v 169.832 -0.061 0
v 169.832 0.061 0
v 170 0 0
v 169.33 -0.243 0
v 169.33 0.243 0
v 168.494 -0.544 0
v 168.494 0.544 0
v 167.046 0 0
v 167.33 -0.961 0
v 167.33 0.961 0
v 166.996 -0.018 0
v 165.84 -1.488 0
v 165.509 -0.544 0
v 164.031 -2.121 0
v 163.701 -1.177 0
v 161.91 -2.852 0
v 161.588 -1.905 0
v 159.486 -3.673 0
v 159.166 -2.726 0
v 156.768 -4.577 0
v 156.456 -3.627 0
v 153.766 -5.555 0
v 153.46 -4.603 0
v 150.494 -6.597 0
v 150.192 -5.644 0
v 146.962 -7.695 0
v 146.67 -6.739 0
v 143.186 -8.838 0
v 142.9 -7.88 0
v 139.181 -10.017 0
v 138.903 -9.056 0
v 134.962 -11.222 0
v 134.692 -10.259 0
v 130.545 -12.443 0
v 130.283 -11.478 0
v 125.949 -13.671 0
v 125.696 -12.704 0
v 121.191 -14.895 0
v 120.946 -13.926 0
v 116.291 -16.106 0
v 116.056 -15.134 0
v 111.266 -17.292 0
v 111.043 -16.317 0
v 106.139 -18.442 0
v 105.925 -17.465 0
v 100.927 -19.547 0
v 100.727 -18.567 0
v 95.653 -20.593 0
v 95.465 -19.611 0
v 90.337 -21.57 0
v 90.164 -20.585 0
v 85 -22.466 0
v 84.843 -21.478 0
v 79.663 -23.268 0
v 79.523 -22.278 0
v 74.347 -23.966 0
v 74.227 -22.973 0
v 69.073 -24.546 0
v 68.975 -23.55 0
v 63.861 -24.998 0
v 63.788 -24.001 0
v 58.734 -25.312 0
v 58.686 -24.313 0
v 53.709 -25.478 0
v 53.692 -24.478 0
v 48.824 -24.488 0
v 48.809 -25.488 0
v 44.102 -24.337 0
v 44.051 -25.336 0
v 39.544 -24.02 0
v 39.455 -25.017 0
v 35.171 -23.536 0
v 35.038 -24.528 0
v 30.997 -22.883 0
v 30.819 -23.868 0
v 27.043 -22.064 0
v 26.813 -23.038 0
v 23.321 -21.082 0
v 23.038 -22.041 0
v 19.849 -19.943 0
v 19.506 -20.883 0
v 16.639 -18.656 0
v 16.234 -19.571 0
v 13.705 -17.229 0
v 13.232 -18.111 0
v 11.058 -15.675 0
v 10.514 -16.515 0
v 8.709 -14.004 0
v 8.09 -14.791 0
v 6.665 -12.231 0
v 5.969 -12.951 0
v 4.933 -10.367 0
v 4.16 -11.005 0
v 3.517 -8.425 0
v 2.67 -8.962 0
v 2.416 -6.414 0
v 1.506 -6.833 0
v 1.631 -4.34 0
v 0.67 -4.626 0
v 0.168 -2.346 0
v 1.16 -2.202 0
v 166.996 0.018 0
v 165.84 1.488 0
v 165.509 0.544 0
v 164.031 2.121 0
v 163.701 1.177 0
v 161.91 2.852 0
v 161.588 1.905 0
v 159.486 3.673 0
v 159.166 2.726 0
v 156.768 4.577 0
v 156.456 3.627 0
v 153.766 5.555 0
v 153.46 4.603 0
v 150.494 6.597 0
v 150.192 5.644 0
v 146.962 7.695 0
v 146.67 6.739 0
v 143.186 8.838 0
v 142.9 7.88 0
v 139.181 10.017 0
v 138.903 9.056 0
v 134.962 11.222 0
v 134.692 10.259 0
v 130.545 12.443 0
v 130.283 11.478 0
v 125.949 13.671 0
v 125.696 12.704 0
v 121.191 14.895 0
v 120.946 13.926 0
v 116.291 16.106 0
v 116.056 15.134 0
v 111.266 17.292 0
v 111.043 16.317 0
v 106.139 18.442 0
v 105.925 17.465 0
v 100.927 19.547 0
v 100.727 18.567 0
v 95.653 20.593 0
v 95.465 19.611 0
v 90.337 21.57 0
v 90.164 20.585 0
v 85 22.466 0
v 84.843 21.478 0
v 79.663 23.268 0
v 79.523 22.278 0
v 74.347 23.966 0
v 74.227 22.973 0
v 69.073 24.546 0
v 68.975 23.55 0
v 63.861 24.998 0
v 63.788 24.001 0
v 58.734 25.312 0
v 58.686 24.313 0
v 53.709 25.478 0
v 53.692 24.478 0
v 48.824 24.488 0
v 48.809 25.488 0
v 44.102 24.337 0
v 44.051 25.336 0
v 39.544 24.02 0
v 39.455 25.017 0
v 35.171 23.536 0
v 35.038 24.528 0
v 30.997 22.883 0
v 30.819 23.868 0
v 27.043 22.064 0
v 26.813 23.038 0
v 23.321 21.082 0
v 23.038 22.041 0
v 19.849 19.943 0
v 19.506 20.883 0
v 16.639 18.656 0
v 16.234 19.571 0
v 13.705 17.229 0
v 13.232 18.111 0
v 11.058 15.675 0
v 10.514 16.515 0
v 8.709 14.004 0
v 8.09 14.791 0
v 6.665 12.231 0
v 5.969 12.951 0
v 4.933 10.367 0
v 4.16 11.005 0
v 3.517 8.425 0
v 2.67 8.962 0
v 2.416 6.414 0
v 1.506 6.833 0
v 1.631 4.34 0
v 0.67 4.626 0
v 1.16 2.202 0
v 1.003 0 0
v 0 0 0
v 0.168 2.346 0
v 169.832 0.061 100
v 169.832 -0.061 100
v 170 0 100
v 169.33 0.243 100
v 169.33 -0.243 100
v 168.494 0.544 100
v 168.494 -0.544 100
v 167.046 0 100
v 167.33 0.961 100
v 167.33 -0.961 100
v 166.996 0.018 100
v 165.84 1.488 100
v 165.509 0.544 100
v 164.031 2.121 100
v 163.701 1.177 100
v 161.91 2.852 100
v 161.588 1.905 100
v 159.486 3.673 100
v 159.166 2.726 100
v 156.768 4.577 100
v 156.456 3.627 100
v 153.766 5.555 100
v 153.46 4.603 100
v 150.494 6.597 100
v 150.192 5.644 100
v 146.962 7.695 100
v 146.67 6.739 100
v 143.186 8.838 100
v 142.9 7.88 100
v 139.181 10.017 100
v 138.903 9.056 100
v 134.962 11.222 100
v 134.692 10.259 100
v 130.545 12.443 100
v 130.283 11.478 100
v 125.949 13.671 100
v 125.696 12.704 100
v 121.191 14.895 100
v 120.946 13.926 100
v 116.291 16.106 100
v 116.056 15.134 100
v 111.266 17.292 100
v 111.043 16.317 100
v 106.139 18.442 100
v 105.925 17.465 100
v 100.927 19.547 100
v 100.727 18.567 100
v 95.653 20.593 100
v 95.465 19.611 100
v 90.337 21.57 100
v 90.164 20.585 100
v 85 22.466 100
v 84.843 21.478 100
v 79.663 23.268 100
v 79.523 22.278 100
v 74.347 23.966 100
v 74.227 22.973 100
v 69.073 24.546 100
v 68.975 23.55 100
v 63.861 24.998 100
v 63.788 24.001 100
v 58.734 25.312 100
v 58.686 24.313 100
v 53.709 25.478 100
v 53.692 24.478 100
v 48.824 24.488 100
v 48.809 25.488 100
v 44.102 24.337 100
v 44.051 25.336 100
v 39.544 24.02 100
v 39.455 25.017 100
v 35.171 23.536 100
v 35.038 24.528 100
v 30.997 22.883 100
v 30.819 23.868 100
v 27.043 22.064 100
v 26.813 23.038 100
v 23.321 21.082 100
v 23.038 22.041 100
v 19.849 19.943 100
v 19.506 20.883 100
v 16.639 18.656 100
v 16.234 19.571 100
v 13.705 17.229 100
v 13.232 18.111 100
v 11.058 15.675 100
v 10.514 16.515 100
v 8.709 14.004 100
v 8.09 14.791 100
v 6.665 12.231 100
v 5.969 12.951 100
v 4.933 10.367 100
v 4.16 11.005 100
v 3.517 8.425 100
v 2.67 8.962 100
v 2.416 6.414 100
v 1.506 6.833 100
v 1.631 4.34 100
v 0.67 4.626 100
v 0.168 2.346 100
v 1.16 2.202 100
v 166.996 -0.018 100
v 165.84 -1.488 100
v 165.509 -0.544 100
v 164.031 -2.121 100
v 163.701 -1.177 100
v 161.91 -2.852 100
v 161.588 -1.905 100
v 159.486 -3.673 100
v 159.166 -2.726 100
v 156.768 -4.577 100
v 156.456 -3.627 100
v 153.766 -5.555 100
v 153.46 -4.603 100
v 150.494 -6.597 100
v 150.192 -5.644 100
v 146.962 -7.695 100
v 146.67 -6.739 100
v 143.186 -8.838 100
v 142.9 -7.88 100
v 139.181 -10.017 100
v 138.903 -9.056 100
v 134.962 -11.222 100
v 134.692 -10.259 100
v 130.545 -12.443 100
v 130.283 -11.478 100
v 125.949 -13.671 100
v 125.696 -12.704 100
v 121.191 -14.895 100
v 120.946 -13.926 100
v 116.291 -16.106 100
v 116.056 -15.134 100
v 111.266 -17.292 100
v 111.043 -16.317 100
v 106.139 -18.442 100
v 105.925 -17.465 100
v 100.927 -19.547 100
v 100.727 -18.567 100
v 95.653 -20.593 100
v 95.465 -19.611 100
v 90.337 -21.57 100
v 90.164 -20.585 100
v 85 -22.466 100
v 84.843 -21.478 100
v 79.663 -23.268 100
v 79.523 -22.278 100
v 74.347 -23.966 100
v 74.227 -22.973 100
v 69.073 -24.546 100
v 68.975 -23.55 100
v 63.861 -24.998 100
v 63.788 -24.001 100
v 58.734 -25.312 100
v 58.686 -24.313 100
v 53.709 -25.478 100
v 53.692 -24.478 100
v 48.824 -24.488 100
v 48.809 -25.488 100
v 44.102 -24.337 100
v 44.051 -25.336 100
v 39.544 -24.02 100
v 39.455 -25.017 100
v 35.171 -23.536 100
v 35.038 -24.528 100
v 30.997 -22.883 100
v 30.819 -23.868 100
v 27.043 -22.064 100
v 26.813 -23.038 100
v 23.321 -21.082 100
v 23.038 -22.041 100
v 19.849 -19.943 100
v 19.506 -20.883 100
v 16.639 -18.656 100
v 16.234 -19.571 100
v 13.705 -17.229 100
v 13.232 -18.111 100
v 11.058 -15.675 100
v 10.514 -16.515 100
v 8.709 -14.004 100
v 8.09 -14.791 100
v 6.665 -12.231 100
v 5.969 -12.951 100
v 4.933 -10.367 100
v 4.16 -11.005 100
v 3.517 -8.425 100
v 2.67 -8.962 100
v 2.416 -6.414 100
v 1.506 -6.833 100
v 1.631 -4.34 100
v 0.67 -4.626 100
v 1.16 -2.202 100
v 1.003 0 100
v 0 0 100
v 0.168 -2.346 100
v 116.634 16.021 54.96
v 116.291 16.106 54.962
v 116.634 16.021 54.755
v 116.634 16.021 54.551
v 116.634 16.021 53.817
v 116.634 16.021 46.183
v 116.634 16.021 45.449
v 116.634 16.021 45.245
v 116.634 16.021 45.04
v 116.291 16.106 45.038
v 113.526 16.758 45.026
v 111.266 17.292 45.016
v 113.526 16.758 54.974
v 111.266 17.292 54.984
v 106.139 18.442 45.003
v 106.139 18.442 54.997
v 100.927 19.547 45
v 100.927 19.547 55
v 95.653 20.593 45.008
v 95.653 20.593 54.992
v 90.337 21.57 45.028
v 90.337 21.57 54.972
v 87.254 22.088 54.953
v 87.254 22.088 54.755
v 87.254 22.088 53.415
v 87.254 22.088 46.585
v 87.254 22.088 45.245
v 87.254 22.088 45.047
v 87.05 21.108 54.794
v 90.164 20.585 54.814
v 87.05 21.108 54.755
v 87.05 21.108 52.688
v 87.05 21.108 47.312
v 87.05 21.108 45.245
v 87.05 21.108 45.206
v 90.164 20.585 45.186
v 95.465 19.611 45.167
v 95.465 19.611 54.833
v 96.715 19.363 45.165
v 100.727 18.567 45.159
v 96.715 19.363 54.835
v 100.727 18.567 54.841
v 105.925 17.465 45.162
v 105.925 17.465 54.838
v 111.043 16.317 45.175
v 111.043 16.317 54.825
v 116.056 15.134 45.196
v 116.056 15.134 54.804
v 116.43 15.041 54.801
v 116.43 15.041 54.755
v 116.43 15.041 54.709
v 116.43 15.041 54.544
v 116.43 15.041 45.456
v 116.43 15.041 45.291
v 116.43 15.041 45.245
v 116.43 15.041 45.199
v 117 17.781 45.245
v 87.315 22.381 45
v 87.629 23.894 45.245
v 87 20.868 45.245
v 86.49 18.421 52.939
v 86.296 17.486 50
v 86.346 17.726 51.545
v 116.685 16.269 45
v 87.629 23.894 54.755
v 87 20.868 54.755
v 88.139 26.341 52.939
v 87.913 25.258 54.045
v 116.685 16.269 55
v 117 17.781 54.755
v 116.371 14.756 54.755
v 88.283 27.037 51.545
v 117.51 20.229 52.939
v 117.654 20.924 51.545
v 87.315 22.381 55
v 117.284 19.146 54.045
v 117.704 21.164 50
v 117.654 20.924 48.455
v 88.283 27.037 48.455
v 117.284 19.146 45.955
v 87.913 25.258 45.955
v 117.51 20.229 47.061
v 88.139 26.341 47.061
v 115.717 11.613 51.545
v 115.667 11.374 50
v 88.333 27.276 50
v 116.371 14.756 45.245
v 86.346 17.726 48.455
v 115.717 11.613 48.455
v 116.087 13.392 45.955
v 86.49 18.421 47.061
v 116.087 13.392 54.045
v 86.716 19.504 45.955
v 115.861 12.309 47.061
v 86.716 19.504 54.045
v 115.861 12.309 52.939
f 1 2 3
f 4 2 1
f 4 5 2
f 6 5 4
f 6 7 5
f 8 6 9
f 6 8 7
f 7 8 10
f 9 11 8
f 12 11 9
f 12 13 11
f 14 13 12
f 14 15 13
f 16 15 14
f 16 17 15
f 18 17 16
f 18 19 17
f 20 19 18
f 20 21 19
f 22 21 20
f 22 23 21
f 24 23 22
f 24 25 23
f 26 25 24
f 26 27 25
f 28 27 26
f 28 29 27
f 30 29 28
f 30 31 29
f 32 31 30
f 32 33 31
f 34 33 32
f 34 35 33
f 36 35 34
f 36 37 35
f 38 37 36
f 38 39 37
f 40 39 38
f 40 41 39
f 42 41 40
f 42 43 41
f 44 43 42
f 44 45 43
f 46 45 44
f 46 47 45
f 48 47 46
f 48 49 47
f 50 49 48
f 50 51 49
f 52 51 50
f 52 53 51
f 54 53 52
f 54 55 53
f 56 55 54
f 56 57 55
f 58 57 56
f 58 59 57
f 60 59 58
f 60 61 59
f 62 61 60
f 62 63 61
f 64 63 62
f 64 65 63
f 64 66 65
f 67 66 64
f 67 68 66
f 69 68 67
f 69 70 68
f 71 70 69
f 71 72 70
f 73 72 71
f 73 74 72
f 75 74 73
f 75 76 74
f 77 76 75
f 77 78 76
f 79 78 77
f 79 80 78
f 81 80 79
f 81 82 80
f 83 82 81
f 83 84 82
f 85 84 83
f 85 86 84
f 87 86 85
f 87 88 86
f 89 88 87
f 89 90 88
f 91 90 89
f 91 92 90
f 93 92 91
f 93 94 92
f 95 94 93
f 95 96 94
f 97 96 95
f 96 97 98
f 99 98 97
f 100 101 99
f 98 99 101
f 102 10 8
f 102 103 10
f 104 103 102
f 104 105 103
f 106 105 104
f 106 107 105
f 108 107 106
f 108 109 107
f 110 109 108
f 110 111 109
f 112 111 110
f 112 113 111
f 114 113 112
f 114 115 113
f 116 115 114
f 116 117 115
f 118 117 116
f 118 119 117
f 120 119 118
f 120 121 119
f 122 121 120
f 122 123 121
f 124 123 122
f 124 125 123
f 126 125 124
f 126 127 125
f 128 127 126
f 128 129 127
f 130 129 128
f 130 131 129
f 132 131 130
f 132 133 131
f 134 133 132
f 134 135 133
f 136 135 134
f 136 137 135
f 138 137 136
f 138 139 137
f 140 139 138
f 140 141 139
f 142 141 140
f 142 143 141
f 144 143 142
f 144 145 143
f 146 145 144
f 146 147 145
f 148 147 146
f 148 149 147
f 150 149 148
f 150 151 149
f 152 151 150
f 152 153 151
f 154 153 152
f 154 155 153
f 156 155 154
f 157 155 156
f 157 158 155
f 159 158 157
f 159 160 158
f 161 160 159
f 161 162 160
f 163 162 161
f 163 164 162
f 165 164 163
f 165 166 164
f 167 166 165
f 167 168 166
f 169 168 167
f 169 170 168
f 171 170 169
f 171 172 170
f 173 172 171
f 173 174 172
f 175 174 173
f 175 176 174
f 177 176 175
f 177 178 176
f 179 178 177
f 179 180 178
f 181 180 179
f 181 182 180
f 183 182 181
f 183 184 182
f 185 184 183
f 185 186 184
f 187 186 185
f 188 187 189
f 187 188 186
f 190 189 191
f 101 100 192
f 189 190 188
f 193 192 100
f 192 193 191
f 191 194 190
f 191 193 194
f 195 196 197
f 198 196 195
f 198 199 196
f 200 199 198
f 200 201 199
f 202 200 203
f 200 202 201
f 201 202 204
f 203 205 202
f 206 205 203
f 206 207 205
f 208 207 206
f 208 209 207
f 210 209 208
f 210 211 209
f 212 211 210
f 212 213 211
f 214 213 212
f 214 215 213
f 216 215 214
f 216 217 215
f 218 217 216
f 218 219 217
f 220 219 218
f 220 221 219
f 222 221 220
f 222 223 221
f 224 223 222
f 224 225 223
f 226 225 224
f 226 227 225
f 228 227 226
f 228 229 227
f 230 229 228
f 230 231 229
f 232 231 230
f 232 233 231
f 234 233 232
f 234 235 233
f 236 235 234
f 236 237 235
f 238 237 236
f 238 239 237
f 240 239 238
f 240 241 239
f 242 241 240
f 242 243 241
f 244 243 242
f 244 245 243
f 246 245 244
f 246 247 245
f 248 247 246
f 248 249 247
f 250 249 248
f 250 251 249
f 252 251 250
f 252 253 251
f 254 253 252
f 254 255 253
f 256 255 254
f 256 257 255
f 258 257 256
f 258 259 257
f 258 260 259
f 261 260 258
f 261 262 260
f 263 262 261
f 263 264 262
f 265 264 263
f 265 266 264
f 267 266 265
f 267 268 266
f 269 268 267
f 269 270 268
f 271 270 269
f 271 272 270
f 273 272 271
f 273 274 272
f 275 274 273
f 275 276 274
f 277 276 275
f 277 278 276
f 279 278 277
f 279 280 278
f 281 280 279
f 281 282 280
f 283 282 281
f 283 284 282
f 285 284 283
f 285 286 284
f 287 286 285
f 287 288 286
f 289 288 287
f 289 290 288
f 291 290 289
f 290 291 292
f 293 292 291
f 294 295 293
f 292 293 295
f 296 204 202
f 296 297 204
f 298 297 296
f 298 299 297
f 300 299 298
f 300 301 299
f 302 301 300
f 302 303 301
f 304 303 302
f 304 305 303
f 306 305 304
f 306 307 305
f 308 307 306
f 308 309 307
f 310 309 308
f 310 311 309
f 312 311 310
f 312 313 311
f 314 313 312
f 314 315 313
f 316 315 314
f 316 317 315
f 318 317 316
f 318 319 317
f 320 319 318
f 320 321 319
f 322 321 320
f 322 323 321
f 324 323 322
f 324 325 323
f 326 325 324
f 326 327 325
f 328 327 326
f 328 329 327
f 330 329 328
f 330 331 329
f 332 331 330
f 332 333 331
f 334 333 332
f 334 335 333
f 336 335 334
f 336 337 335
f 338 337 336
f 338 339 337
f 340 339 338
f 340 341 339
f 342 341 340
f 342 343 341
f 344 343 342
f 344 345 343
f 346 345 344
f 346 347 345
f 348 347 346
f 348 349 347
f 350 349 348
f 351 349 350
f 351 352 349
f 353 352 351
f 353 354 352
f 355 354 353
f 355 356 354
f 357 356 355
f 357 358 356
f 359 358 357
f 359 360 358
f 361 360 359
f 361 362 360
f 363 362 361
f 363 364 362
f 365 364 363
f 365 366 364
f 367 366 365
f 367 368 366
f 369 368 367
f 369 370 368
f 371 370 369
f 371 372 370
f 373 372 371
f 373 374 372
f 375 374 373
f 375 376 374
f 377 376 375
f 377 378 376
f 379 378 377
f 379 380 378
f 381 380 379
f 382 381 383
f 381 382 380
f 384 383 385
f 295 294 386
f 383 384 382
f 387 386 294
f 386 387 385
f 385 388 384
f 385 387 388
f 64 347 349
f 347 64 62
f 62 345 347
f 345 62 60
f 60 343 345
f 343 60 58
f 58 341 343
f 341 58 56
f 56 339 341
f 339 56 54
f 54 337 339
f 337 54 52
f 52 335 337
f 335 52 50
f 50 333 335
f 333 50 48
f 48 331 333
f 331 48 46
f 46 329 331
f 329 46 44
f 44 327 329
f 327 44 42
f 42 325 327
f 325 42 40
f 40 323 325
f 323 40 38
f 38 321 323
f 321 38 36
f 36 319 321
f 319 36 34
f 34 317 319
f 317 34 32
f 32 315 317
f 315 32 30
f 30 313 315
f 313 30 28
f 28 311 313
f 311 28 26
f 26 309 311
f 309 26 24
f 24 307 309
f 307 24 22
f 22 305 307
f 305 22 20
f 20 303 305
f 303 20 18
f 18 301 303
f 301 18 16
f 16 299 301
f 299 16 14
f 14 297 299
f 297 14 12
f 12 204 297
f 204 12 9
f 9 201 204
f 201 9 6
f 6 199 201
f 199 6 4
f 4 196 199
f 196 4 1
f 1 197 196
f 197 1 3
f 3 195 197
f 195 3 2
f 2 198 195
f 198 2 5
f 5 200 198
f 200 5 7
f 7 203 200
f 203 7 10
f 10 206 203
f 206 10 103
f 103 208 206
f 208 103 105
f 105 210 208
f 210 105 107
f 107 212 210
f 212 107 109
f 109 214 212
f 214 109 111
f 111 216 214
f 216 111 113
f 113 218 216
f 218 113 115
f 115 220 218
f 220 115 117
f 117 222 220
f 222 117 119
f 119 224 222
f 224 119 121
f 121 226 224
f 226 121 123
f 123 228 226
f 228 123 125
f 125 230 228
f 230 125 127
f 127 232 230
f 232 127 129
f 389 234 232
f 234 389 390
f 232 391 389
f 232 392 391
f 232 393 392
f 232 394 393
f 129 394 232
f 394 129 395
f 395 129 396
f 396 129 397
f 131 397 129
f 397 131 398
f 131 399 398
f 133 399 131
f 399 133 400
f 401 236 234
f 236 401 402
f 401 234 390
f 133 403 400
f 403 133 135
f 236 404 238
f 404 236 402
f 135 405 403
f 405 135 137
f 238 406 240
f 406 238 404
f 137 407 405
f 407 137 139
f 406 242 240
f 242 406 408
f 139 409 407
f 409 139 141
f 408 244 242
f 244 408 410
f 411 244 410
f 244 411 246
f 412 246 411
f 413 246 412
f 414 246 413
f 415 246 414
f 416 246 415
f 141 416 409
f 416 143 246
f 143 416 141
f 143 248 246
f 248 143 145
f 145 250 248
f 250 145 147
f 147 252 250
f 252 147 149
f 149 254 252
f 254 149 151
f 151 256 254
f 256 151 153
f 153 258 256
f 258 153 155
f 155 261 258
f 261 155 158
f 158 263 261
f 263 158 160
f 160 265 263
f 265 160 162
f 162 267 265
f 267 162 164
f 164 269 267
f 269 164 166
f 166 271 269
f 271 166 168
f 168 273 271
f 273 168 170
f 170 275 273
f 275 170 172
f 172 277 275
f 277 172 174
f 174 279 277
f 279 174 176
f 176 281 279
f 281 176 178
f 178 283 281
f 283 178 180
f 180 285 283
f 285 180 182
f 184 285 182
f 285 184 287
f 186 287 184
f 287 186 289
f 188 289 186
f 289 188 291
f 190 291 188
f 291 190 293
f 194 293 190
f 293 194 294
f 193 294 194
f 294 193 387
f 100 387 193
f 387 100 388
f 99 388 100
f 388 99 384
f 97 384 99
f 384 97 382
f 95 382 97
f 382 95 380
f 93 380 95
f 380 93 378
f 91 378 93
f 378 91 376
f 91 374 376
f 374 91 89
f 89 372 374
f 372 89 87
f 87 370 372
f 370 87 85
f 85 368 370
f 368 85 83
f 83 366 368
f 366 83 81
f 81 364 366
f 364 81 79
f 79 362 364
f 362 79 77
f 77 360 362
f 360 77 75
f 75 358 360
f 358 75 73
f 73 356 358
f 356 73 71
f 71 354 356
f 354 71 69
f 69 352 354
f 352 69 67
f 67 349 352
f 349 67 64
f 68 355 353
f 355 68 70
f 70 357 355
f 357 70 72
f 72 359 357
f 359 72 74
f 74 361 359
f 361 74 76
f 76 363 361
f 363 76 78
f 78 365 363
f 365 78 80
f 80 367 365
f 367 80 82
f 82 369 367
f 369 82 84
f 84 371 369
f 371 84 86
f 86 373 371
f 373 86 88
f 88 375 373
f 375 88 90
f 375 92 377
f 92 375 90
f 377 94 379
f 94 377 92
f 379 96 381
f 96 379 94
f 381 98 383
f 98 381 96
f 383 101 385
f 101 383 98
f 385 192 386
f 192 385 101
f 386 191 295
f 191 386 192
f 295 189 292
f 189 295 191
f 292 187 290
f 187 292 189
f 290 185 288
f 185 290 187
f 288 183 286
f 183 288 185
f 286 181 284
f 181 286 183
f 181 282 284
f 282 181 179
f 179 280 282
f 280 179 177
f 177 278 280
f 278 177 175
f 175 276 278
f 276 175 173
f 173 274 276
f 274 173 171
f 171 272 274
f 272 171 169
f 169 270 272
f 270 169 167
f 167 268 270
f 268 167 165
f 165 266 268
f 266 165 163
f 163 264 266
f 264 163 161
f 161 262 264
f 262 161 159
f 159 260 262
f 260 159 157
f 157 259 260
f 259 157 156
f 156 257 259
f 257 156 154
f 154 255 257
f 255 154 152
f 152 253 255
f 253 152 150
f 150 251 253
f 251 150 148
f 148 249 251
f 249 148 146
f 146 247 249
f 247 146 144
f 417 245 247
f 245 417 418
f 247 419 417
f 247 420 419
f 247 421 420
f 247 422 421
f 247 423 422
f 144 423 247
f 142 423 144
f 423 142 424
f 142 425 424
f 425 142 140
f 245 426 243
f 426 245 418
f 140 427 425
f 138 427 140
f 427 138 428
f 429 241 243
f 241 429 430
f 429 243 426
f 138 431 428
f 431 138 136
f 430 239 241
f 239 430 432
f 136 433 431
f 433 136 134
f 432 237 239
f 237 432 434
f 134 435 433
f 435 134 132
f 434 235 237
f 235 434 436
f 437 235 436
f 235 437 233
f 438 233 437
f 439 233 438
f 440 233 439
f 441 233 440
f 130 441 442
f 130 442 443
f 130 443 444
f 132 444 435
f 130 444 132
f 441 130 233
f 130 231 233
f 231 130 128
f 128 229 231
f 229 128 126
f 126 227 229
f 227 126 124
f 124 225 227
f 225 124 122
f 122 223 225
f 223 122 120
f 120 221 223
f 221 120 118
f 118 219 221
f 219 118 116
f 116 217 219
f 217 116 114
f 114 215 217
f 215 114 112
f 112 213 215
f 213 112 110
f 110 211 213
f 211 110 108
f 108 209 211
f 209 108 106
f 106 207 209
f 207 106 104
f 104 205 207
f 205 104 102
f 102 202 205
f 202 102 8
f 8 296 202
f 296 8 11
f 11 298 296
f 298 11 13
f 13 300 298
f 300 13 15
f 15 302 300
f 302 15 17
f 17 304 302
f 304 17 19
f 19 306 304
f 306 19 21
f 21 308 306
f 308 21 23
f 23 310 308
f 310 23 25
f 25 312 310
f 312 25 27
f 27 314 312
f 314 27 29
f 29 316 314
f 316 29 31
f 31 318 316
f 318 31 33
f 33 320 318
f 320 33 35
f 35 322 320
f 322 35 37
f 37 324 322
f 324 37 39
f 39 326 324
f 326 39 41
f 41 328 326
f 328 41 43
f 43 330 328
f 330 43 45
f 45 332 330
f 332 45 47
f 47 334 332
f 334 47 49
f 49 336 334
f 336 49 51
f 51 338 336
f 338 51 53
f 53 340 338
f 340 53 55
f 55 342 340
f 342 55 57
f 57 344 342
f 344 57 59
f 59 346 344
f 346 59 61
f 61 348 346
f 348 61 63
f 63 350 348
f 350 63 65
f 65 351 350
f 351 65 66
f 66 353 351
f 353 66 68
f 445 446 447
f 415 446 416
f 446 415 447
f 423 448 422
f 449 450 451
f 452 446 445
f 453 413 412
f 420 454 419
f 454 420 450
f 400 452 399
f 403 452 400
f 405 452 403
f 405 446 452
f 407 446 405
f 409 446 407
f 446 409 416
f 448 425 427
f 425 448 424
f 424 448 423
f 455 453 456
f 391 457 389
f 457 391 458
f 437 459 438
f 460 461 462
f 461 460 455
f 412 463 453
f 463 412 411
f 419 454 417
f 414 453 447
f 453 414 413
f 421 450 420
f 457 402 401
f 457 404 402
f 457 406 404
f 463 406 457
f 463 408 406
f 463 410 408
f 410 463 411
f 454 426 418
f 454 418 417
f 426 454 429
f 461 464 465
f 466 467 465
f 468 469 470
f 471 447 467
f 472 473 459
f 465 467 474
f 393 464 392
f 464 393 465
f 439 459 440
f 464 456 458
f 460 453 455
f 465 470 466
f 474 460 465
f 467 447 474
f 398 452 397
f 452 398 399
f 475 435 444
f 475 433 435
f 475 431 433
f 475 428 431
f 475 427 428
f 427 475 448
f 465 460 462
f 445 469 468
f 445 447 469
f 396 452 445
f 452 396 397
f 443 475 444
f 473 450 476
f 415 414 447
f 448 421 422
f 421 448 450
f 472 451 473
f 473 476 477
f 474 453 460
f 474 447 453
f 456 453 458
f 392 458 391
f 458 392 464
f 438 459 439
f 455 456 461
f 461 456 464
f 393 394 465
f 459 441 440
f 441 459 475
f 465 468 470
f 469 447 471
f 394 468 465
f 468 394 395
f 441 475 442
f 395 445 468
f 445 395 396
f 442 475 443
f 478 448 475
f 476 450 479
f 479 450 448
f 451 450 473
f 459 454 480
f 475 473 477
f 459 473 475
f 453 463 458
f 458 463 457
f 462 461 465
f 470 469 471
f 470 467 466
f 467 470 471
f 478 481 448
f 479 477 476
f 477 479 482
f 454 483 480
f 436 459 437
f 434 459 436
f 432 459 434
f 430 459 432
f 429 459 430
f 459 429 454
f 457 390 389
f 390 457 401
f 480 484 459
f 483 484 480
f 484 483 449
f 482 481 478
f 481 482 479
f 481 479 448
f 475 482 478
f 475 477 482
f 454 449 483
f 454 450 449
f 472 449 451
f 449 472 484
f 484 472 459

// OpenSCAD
// file: lib/naca4.scad
// Naca4.scad - library for parametric airfoils of 4 digit NACA series
// Code: Rudolf Huttary, Berlin 
// June 2015
// commercial use prohibited


// general use: for more examples refer to sampler.scad
// naca = naca digits or 3el vector  (default = 12 or [0, 0, .12])
// L    = chord length [mm]      (default= 100)
// N    = # sample points        (default= 81)
// h    = height [mm]            (default= 1)
// open = close at the thin end? (default = true)
// two equivalent example calls
 airfoil(naca = 2408, L = 60, N=1001, h = 30, open = false); 
// airfoil(naca = [.2, .4, .32], L = 60, N=1001, h = 30, open = false); 

module help()
{
  echo(str("\n\nList of signatures in lib:\n=================\n", 
  "module airfoil(naca=2412, L = 100, N = 81, h = 1, open = false) - renders airfoil object\n", 
  "module airfoil(naca=[.2, .4, .12], L = 100, N = 81, h = 1, open = false) - renders airfoil object using percentage for camber,  camber distance and thicknes\n", 
  "function airfoil_data(naca=12, L = 100, N = 81, open = false)\n",
  "=================\n")); 
}

help(); 
// this is the object
module airfoil(naca=12, L = 100, N = 81, h = 1, open = false)
{
  linear_extrude(height = h)
  polygon(points = airfoil_data(naca, L, N, open)); 
}

module hollow_airfoil(lnaca=12, L = 100, N = 81, h = 1, open = false, wall_thickness = 1)
{
    if (open){
        linear_extrude(height = h)
            difference(){
                polygon(points = airfoil_data(naca, L, N, false));
                offset(delta = - wall_thickness, chamfer = false) polygon(points = airfoil_data(naca, L, N, open = false));
            }
    }
    else{

        linear_extrude(height = wall_thickness)
            polygon(points = airfoil_data(naca, L, N, false)); 

        linear_extrude(height = h)
            difference(){
                polygon(points = airfoil_data(naca, L, N, open));
                offset(delta = - wall_thickness) polygon(points = airfoil_data(naca, L, N, open = false));
            }

        translate([0,0, h - wall_thickness])
            linear_extrude(height = wall_thickness)
                polygon(points = airfoil_data(naca, L, N, false)); 

    }
}


// this is the main function providing the airfoil data
function airfoil_data(naca=12, L = 100, N = 81, open = false) = 
  let(Na = len(naca)!=3?NACA(naca):naca)
  let(A = [.2969, -0.126, -.3516, .2843, open?-0.1015:-0.1036])
  [for (b=[-180:360/(N):179.99]) 
    let (x = (1-cos(b))/2)  
    let(yt = sign(b)*Na[2]/.2*(A*[sqrt(x), x, x*x, x*x*x, x*x*x*x])) 
    Na[0]==0?L*[x, yt]:L*camber(x, yt, Na[0], Na[1], sign(b))];  


function trailing_edge_angle(naca=12, open = false) = 
  let(Na = len(naca)!=3?NACA(naca):naca)
  let(A = [.2969, -0.126, -.3516, .2843, open?-0.1015:-0.1036])
  let (x =0.999)  // set x near to airfoil trailing edge
  let(yt = Na[2]/.2*(A*[sqrt(x), x, x*x, x*x*x, x*x*x*x])) // calculate distance from x-axis at previously set position
  atan2(yt,1-x);  // calculate angle of triangle between end of airfoil. The triange height corresponds to previously calculated distance from x-axis

function surface_angle(x = 0.5, naca=12, open = false) = 
  let(Na = len(naca)!=3?NACA(naca):naca)
  let(A = [0.2969, -0.126, -0.3516, 0.2843, open?-0.1015:-0.1036])
  let(dy = Na[2]/0.2*(A*[(1/2)*(1/sqrt(x)), 1, 2*x, 3*x*x, 4*x*x*x])) // calculate derivative of airfoil function at the x point
  atan(dy);  // calculate  the angle from function derivative

function surface_distance(x = 0.5, naca=12, open = false) = 
  let(Na = len(naca)!=3?NACA(naca):naca)
  let(A = [0.2969, -0.126, -0.3516, 0.2843, open?-0.1015:-0.1036])
  Na[2]/.2*(A*[sqrt(x), x, x*x, x*x*x, x*x*x*x]); // calculate distance from x-axis at previously set position

// helper functions
function NACA(naca) = 
  let (M = floor(naca/1000))
  let (P = floor((naca-M*1000)/100)) 
  [M/100, P/10, floor(naca-M*1000-P*100)/100];  

function camber(x, y, M, P, upper) = 
  let(yc = (x<P)?M/P/P*(2*P*x-x*x): M/(1-P)/(1-P)*(1 - 2*P + 2*P*x -x*x))
  let(dy = (x<P)?2*M/P/P*(P-x):2*M/(1-P)/(1-P)*(P-x))
  let(th = atan(dy))
  [upper ? x - y*sin(th):x + y*sin(th), upper ? yc + y*cos(th):yc - y*cos(th)];
// main file
use <./lib/naca4.scad>



draft = true;   // sets rendering quality to draft.
$fs = draft ? 5 : 0.5;
$fa = 10;

cylinder_position = 0.6;

    airfoil_thickness = 0030;

    hollow_airfoil(naca = airfoil_thickness, L = 170, N = 100, h = 100, open = true,  wall_thickness = 1);

    distance = surface_distance(x = cylinder_position, naca=airfoil_thickness, open = false);
    angle = surface_angle(x = cylinder_position, naca=airfoil_thickness, open = false);
    echo("surface distance is:", distance);
    echo("angle of surface is:", angle);

translate([170*cylinder_position,170*distance,50])
    rotate([0,90,angle])
        cylinder(d=10, h = 30, $fn = 20, center = true);
